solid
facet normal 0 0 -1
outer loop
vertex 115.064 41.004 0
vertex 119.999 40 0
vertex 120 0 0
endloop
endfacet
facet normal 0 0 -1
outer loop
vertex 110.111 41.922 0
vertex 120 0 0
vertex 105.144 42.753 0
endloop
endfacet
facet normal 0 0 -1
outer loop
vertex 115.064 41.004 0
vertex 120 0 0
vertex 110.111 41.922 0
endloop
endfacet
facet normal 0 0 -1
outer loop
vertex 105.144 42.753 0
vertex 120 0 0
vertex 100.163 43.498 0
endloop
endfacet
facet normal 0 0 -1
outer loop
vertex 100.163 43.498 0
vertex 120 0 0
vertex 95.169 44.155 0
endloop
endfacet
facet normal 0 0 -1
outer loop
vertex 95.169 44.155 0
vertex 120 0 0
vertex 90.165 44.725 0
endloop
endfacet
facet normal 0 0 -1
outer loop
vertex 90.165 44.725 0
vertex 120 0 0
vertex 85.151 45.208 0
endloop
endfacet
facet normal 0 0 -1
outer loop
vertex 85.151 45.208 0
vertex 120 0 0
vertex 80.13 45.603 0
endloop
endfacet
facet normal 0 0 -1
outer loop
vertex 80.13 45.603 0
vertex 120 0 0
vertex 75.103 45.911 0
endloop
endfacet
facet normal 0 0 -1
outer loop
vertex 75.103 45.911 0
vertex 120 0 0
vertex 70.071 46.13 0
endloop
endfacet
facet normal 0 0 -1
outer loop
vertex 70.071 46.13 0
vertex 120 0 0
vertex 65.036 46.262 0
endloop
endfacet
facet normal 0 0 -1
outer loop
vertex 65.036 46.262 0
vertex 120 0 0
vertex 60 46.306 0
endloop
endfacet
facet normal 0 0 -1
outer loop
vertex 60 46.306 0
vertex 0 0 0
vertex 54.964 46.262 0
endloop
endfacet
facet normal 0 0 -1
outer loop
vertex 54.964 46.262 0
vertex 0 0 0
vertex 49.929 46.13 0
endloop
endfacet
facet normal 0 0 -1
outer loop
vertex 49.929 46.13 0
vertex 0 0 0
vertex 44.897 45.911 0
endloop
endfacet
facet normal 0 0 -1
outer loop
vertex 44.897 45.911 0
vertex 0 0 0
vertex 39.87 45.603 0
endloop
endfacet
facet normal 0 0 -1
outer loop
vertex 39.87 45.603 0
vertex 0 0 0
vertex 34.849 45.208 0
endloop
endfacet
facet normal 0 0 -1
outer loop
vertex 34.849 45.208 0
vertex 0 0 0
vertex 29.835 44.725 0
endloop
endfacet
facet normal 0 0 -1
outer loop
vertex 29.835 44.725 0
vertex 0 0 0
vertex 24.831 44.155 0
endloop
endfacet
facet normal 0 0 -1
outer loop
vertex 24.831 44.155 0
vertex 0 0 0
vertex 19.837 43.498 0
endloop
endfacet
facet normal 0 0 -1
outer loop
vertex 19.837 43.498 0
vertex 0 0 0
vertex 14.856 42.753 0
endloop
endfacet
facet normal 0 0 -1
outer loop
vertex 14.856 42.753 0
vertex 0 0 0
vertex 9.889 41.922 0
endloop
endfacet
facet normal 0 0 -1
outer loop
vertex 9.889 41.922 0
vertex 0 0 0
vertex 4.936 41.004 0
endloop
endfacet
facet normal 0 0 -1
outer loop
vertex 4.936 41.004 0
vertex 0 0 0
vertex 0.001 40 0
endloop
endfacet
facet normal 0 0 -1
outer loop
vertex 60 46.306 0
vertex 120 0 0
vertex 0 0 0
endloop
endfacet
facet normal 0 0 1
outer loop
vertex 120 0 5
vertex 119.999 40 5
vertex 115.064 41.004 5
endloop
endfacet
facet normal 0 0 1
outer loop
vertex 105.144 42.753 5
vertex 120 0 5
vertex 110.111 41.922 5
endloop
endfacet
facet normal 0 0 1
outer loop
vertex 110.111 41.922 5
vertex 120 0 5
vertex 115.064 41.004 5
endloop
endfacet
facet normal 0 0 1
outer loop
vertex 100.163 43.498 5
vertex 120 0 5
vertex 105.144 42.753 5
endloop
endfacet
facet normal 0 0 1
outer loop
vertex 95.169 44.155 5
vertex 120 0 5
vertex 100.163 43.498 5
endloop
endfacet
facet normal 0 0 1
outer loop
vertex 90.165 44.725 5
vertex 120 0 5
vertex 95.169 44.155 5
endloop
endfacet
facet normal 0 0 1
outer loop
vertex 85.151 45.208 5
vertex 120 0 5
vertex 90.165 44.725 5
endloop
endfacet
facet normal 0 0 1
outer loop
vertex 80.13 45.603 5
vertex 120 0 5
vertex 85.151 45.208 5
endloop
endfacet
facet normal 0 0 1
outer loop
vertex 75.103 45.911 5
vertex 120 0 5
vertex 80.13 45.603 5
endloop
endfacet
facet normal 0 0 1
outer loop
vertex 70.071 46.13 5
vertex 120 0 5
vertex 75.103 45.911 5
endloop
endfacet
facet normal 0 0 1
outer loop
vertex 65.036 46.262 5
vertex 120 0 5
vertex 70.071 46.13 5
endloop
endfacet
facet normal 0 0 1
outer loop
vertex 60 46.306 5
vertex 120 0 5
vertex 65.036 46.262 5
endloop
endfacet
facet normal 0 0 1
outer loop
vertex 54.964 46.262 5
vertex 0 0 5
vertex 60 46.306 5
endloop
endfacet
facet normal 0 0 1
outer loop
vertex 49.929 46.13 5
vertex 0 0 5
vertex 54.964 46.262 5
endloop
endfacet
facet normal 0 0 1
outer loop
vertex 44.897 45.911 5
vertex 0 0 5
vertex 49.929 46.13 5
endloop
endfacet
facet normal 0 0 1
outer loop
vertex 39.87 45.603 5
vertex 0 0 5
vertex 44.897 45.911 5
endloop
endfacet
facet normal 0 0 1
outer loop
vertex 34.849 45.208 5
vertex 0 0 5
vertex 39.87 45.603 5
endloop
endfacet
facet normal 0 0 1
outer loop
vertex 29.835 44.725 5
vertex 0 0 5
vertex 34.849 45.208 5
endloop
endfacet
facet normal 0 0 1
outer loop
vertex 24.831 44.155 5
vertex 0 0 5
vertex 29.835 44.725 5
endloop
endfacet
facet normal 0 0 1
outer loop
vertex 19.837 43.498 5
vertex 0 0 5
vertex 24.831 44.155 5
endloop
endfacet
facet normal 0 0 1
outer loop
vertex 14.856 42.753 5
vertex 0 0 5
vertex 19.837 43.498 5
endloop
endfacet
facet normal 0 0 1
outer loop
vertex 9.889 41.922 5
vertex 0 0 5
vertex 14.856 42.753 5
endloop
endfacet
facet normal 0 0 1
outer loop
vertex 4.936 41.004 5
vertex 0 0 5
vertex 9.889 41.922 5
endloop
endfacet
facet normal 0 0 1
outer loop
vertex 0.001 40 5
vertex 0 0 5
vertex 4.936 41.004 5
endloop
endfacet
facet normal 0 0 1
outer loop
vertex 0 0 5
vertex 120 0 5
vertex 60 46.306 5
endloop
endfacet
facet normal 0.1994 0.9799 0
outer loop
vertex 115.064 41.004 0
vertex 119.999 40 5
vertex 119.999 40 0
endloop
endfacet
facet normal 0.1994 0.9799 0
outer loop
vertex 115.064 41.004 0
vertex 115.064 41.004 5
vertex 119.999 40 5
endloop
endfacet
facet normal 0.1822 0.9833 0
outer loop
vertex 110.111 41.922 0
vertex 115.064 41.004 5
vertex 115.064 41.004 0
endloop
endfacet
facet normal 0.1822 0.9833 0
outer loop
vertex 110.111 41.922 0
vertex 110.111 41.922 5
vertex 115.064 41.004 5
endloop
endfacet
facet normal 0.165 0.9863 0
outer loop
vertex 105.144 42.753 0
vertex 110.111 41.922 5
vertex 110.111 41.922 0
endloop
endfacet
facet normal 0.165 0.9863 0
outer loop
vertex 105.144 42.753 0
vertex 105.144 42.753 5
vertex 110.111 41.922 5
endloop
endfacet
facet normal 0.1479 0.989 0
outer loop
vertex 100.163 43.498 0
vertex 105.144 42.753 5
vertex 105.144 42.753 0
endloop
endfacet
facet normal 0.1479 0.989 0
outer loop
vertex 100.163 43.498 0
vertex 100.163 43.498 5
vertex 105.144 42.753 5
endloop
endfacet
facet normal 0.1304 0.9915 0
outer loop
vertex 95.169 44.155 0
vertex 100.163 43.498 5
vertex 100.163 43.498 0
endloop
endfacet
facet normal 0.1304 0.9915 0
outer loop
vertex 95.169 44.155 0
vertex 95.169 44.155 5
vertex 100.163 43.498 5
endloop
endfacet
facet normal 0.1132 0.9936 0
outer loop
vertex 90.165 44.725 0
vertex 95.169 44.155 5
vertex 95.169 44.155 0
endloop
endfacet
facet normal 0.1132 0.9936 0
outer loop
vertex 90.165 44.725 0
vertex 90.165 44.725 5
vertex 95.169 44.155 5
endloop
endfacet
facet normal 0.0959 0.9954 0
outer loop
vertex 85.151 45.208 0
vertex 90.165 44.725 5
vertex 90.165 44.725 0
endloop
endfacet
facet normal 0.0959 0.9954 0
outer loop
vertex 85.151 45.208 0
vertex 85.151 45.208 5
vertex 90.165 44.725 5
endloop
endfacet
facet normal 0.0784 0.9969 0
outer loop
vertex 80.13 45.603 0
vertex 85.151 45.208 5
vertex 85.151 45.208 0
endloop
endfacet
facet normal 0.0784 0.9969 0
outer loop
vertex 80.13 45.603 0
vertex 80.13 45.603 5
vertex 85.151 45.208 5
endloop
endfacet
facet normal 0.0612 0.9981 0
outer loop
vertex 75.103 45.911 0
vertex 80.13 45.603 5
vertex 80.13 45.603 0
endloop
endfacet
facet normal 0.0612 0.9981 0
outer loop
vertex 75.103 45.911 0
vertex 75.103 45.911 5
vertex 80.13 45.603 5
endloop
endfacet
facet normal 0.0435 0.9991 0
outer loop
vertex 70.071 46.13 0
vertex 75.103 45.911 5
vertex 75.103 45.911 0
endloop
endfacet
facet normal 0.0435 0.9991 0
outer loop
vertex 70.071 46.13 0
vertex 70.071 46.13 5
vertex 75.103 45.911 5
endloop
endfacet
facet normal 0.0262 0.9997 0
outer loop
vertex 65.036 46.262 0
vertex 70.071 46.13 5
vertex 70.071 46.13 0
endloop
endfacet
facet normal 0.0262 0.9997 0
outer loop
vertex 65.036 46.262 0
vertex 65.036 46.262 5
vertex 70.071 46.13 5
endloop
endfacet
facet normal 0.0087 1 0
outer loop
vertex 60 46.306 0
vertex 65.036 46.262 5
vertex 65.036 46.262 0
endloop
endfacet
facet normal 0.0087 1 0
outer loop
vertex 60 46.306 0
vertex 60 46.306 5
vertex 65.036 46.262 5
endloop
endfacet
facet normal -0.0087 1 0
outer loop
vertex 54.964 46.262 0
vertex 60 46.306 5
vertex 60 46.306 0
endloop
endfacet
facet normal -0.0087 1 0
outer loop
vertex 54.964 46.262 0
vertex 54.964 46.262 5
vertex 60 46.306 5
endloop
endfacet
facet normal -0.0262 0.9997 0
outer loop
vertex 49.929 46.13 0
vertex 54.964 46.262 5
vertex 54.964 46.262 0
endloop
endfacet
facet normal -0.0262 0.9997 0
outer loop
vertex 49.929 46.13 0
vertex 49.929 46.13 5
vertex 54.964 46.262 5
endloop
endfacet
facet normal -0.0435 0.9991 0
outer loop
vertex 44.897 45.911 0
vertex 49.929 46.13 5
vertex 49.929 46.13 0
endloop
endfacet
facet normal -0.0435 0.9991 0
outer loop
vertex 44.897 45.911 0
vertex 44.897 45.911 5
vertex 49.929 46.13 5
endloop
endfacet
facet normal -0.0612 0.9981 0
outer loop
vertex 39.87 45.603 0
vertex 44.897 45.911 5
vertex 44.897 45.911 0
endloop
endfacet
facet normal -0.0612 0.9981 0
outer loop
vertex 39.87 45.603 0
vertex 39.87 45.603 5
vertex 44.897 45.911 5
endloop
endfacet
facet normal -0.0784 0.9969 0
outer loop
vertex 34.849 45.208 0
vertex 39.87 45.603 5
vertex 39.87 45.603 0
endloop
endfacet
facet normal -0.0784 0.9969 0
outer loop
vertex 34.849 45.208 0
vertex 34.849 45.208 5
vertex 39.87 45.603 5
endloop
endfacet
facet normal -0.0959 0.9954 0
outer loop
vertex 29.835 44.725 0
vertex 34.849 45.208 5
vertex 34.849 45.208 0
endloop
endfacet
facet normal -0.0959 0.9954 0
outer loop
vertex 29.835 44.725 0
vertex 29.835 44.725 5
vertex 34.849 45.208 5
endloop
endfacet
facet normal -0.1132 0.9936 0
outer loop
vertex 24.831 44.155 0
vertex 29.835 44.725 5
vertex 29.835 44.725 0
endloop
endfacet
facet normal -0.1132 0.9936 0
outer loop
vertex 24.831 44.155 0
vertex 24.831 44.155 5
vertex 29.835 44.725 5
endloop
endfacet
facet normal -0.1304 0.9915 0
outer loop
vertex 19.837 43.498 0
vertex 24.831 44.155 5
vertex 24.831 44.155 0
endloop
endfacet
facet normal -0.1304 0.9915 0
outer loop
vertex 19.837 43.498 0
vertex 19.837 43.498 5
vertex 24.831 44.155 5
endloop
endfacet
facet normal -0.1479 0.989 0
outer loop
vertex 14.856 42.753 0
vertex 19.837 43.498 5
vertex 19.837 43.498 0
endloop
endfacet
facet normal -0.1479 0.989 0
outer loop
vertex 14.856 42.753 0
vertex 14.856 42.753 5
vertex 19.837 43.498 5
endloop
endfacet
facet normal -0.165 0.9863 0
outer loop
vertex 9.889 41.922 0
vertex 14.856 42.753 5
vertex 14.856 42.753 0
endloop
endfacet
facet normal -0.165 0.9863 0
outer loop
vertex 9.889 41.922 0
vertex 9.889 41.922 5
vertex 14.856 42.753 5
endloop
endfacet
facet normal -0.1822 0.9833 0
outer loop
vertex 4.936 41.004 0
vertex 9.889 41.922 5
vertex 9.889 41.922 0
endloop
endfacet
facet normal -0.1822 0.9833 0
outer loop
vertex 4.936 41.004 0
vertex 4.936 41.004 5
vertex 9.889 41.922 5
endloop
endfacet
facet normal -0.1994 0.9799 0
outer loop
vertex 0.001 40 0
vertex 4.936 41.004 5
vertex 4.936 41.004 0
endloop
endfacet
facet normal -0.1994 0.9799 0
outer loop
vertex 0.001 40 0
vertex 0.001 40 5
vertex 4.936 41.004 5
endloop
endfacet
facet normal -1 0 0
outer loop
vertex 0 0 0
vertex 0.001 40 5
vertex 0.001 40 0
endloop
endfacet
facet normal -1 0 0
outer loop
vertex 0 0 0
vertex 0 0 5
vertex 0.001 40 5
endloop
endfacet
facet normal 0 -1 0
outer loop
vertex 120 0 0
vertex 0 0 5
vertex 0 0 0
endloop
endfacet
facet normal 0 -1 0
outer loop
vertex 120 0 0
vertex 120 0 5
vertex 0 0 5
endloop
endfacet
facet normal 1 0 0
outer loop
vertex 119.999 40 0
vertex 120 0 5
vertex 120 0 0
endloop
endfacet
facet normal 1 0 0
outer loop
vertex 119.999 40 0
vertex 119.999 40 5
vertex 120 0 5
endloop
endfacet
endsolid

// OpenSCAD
$fn = 32;

// ----------------------------------------------------------------------
// Arc profile plate: crown, 27 points
// ----------------------------------------------------------------------

// --- parameters (mm) ---
bar_l = 120;              // bar length, X
bar_w = 40;               // bar height at the ends, Y
arc_r = 288.58;           // radius of the crown arc
arc_angle = 24;           // crown arc angle, degrees
crown_rise = 6.31;        // rise of the crown over the ends
arc_step = 1;             // sampling step of the crown arc, degrees
plate_t = 5;              // plate thickness, Z

bbox_y = bar_w + crown_rise;  // full height with the crown

profile = [[119.999, 40], [115.064, 41.004], [110.111, 41.922], [105.144, 42.753], [100.163, 43.498], [95.169, 44.155], [90.165, 44.725], [85.151, 45.208], [80.13, 45.603], [75.103, 45.911], [70.071, 46.13], [65.036, 46.262], [60, 46.306], [54.964, 46.262], [49.929, 46.13], [44.897, 45.911], [39.87, 45.603], [34.849, 45.208], [29.835, 44.725], [24.831, 44.155], [19.837, 43.498], [14.856, 42.753], [9.889, 41.922], [4.936, 41.004], [0.001, 40], [0, 0], [120, 0]];  // primary outline, 27 points, counter clockwise

// --- the one profile operation ---
linear_extrude(height = plate_t) polygon(points = profile);
